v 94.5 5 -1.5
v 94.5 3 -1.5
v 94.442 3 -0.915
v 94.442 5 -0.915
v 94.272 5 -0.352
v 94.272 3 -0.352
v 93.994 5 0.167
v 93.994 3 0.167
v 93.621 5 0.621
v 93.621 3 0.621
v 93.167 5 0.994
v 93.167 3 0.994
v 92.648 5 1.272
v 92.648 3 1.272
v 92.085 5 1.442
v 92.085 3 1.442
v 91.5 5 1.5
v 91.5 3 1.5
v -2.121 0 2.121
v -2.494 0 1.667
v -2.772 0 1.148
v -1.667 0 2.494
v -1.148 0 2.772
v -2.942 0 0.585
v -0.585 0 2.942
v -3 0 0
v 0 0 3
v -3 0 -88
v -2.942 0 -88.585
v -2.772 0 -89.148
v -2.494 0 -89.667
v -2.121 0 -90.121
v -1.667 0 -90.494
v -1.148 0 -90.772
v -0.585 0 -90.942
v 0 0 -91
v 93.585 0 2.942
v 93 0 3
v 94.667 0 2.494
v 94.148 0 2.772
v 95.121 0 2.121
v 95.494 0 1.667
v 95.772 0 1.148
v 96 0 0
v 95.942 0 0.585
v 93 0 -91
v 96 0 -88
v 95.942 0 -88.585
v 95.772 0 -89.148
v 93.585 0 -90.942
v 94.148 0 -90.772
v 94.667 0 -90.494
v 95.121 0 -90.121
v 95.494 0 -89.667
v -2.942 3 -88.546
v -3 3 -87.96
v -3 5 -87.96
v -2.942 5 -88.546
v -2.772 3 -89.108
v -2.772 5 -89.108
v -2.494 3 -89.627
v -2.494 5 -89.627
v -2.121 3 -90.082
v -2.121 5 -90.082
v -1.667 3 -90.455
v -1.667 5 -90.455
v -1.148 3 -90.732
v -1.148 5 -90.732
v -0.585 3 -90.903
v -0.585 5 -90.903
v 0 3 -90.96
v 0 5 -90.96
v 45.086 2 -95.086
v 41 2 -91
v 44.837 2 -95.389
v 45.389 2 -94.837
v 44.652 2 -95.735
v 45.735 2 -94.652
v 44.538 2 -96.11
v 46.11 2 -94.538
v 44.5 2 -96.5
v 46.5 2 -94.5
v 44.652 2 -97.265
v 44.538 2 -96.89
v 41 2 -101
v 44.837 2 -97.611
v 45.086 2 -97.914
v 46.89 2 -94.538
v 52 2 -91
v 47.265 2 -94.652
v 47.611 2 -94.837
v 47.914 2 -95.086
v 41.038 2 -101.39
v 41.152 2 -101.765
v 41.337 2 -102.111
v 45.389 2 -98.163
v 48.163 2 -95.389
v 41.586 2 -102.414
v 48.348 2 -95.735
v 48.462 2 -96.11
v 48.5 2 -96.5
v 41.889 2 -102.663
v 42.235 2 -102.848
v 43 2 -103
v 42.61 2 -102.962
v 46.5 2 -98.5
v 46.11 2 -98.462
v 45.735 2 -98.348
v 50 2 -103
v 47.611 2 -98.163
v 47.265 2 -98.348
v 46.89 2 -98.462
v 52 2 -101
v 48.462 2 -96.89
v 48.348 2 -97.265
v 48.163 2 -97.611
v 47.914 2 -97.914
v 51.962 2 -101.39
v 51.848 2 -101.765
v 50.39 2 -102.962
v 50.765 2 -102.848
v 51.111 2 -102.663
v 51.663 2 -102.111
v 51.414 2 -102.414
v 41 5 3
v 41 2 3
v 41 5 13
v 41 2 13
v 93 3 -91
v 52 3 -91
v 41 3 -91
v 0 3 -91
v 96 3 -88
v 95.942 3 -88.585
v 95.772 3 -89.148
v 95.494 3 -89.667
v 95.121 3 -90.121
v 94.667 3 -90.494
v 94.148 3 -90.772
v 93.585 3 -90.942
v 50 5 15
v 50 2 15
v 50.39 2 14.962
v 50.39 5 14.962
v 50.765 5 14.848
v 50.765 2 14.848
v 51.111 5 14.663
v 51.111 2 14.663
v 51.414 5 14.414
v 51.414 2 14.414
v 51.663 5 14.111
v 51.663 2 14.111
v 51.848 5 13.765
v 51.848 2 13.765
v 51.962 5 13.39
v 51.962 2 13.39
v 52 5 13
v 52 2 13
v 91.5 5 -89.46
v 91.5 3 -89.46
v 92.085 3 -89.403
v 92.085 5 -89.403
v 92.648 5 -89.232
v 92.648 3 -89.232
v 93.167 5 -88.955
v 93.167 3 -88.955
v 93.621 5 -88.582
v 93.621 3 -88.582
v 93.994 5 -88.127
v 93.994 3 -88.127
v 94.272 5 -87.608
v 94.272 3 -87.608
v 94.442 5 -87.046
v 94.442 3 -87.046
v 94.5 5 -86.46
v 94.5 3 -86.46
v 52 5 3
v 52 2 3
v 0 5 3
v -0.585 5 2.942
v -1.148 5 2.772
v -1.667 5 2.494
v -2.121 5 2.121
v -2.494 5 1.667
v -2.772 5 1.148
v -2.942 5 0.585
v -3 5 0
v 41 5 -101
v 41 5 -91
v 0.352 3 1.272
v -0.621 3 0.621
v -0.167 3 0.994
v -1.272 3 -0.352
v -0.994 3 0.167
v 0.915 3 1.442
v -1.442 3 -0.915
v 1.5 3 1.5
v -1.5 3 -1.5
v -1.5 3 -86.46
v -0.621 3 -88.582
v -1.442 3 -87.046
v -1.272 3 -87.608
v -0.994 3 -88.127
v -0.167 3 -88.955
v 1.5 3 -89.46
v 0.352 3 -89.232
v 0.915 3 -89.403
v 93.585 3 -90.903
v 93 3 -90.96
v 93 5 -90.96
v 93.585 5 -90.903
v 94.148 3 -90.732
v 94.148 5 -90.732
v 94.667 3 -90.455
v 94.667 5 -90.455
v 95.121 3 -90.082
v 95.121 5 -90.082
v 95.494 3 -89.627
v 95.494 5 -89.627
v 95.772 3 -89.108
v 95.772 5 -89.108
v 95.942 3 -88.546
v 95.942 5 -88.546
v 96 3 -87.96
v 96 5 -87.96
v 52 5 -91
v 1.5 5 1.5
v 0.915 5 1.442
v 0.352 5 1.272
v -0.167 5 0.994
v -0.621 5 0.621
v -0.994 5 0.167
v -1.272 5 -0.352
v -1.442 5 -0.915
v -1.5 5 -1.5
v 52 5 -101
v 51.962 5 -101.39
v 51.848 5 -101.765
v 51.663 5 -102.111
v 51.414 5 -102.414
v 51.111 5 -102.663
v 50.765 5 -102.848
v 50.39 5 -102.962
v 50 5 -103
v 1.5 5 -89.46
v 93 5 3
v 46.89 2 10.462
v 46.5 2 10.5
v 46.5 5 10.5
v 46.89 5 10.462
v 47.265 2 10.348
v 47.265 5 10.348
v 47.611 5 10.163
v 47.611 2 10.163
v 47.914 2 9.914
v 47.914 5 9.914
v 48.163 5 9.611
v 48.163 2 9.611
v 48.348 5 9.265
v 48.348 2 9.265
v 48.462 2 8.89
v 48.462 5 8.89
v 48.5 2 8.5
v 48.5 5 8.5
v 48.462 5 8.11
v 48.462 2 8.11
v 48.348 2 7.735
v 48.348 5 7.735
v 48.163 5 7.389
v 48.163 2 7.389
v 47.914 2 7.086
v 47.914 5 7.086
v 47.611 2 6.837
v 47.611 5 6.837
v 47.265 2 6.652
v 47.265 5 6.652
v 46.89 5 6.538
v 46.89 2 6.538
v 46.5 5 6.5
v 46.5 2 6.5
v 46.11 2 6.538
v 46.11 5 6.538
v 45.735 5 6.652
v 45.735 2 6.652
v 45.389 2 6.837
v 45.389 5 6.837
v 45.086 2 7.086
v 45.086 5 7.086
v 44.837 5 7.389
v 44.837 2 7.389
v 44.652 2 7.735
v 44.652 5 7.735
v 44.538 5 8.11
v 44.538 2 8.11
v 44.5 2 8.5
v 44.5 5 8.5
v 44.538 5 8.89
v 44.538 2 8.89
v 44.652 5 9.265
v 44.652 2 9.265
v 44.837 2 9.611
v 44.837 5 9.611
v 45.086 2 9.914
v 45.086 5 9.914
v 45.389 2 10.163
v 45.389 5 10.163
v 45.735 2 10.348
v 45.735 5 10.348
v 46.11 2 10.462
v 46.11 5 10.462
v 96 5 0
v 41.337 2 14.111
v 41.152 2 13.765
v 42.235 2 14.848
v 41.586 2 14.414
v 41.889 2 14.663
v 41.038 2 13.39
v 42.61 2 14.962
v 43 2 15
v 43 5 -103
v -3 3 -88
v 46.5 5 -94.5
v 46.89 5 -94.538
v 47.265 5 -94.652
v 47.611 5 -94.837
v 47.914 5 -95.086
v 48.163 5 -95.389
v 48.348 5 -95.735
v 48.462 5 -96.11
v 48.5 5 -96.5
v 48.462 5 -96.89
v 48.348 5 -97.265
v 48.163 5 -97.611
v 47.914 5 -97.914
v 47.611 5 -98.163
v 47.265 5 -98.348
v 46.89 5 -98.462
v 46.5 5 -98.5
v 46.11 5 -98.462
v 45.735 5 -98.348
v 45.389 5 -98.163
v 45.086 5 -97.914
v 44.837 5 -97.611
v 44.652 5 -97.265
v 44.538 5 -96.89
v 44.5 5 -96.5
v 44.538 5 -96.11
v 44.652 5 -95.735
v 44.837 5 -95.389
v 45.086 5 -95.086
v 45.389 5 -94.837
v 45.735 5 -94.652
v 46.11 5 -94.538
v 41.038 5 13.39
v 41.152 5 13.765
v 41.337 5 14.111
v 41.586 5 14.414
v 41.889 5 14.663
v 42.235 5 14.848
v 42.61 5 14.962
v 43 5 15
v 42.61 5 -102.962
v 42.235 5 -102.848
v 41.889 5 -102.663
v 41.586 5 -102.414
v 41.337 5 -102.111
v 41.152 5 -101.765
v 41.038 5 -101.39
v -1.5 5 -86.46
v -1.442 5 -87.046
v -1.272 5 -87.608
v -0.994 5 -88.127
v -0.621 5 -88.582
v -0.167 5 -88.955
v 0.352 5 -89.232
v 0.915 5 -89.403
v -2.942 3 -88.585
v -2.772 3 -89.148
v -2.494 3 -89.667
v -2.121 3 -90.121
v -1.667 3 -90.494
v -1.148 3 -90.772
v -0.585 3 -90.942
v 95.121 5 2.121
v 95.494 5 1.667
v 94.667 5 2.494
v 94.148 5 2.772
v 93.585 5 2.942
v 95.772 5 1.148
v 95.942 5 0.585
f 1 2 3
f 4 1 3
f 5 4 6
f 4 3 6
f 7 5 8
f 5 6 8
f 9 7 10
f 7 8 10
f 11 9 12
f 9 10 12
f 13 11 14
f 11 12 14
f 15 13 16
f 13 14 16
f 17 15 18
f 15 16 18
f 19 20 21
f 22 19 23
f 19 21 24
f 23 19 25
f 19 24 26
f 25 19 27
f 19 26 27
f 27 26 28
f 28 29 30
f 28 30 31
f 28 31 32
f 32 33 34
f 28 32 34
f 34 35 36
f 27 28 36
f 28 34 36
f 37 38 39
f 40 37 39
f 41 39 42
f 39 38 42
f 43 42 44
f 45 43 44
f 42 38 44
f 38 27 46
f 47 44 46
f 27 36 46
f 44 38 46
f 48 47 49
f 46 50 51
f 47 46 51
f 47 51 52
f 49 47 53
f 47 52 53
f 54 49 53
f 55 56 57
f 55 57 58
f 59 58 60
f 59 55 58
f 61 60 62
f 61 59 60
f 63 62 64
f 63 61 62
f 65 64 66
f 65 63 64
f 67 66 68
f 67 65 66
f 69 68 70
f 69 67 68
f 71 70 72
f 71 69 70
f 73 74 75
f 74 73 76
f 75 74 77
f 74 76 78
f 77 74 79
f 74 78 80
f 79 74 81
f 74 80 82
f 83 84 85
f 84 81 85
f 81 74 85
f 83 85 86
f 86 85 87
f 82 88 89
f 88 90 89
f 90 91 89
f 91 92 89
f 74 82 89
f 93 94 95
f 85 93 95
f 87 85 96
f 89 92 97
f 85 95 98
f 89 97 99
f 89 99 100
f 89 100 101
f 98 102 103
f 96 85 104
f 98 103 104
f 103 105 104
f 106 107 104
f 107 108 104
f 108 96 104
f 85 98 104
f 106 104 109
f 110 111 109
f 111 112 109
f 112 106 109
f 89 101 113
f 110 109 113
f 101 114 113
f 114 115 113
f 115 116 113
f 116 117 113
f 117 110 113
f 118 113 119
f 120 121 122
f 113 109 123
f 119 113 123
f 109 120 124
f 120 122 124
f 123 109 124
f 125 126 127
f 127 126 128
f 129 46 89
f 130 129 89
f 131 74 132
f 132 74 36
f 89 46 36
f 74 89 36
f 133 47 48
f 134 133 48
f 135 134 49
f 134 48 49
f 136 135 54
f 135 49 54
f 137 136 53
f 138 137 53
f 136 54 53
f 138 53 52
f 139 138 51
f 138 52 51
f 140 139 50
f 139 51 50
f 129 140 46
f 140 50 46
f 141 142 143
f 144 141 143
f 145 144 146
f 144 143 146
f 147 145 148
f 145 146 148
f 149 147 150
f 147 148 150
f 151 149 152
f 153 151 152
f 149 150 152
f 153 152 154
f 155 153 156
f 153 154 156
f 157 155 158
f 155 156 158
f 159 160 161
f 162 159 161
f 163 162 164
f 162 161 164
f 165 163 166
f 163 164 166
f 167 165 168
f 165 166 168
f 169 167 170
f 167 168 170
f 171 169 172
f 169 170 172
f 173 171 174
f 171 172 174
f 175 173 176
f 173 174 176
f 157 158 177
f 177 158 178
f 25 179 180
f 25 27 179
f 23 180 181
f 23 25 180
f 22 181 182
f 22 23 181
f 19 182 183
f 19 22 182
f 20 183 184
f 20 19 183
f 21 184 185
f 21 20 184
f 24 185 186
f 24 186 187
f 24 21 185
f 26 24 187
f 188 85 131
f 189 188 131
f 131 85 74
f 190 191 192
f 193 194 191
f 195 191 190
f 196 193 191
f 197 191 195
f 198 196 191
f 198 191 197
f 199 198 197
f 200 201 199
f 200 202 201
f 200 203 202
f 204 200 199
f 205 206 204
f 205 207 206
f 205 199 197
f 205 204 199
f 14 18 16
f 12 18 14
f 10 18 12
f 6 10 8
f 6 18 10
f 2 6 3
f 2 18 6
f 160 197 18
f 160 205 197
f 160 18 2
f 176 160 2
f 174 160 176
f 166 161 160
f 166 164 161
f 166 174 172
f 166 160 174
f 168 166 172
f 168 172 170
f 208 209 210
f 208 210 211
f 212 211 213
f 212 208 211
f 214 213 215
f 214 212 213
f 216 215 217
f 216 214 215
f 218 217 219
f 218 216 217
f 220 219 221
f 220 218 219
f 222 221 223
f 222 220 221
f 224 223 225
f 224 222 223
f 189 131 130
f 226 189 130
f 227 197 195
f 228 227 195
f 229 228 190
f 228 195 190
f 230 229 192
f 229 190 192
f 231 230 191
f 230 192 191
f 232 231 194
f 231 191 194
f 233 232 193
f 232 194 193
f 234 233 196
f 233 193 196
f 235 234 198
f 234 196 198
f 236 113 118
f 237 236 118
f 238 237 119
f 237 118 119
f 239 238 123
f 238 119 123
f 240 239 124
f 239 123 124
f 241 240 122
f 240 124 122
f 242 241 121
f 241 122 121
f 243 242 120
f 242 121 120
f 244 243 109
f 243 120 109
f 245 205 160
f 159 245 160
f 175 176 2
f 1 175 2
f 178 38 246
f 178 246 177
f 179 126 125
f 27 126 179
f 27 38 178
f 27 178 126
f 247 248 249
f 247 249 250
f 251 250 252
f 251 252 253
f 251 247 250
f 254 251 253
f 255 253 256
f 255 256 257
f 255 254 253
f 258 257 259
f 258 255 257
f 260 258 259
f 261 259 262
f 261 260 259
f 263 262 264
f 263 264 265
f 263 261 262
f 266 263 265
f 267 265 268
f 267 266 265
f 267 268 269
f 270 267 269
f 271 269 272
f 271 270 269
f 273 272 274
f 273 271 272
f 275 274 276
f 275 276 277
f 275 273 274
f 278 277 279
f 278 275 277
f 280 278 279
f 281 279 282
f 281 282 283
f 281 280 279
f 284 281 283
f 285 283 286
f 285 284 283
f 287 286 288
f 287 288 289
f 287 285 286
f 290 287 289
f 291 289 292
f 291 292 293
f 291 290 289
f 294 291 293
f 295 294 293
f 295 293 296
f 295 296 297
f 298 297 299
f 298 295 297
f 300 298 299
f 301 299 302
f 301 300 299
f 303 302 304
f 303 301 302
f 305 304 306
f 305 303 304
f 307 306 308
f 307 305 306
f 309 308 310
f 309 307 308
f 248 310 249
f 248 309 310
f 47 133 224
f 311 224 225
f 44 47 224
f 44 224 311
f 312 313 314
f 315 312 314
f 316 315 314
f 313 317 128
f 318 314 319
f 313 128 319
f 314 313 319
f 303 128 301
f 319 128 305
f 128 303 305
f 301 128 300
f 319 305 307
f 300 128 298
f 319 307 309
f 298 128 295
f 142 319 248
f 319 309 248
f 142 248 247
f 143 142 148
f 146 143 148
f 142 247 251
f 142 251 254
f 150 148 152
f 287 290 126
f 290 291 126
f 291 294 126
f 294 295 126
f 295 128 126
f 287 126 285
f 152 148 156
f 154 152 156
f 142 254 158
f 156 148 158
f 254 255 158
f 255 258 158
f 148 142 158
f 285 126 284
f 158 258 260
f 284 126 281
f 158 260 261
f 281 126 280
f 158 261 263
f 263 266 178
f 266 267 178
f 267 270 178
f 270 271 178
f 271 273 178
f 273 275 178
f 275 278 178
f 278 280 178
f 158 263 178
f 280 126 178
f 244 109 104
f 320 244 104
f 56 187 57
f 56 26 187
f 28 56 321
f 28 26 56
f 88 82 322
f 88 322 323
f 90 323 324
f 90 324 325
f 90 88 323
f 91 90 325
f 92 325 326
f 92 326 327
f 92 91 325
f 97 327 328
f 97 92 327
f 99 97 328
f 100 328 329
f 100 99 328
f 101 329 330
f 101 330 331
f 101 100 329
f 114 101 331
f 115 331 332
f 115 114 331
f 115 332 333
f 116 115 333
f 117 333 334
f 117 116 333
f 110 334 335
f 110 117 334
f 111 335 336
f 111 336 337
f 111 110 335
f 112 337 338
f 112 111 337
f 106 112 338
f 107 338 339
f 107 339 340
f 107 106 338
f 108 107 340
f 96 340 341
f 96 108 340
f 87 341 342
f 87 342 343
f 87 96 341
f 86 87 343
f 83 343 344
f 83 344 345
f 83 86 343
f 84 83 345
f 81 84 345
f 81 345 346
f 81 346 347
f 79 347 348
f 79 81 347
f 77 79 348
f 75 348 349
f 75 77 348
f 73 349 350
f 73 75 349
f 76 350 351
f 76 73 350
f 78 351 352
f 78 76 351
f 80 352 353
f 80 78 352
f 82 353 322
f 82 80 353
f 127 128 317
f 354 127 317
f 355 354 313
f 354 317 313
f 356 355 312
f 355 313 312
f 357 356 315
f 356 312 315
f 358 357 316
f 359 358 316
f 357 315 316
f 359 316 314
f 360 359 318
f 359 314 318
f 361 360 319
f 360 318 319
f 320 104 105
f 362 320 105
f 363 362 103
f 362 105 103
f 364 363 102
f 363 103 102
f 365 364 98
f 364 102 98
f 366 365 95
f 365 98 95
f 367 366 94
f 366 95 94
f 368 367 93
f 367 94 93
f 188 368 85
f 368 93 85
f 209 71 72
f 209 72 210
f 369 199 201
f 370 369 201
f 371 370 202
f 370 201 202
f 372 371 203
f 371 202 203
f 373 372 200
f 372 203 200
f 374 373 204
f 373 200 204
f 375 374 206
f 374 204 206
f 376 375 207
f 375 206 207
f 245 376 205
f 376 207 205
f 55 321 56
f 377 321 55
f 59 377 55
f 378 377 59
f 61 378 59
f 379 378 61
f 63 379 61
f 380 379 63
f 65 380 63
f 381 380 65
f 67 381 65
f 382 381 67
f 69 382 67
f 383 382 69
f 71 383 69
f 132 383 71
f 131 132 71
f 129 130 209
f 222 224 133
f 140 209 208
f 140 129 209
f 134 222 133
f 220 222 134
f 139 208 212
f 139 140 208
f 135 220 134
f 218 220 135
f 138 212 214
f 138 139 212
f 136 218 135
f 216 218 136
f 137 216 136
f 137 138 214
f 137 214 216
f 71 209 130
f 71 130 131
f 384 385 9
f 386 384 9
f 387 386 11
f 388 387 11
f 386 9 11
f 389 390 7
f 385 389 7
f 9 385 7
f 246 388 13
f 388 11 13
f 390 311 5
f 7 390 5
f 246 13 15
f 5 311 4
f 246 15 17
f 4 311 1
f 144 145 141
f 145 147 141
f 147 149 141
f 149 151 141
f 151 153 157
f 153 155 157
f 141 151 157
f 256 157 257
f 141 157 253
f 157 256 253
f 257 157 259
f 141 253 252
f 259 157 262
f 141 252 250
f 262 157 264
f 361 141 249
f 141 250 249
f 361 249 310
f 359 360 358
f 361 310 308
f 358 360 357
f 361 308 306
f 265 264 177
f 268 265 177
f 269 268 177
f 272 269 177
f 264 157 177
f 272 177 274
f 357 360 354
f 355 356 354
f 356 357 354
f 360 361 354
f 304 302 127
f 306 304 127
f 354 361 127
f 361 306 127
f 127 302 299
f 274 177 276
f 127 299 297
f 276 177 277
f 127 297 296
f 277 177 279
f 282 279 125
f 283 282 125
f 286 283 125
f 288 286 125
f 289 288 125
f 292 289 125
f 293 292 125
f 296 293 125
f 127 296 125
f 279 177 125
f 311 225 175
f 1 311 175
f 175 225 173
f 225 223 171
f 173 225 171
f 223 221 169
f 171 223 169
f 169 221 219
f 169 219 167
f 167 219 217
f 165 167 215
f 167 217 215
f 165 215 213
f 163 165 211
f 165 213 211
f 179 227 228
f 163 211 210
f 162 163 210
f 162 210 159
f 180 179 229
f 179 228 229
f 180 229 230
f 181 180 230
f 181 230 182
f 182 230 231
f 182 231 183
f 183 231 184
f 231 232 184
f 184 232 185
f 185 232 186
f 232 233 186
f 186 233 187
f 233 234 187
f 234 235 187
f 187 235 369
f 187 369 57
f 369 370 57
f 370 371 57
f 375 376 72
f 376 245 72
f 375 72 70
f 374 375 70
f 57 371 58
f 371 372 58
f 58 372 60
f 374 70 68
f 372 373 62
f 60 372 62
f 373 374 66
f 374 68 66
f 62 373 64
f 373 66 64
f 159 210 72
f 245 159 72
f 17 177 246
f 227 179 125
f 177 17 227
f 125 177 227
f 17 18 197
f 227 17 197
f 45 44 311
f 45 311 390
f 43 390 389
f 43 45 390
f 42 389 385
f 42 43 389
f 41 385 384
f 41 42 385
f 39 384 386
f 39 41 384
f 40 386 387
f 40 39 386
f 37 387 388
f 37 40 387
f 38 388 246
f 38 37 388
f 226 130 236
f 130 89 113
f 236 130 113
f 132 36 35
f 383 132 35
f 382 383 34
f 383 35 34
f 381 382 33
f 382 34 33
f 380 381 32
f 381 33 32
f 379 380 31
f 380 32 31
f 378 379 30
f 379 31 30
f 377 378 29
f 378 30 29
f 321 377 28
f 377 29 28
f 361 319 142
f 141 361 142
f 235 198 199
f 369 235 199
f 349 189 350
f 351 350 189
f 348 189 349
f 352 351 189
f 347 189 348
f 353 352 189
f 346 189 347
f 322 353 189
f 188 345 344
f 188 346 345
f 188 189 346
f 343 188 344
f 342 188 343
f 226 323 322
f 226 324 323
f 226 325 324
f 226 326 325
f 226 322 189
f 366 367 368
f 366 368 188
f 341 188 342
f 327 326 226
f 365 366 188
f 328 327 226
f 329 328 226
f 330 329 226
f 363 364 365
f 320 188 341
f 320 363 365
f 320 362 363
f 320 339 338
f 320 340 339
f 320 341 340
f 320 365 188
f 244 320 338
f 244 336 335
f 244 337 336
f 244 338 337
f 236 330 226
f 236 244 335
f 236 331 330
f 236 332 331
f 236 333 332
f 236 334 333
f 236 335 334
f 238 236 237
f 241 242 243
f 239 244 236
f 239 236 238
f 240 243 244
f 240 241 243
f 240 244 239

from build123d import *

# Parameters (mm, degrees)
RESSALTO_EXTRUS_O2_DEPTH = 3
RESSALTO_EXTRUS_O3_START = 2
ESBO_O1_8_R              = 2
RESSALTO_EXTRUS_O3_DEPTH = 3
RESSALTO_EXTRUS_O4_DEPTH = 2


with BuildPart() as part:
    # Esboço1 → Ressalto-extrusão2 (new body)
    with BuildSketch(Plane(origin=(0, 0, 0), x_dir=(1, 0, 0), z_dir=(0, 1, 0))):
        with BuildLine():
            ThreePointArc((-3, 0), (-2.121320344, -2.121320344), (0, -3))
            Line((0, -3), (41, -3))
            Line((41, -3), (52, -3))
            Line((52, -3), (93, -3))
            ThreePointArc((93, -3), (95.121320344, -2.121320344), (96, 0))
            Line((96, 0), (96, 38.5))
            Line((96, 38.5), (96, 49.5))
            Line((96, 49.5), (96, 88))
            ThreePointArc((96, 88), (95.121320344, 90.121320344), (93, 91))
            Line((93, 91), (52, 91))
            Line((52, 91), (41, 91))
            Line((41, 91), (0, 91))
            ThreePointArc((0, 91), (-2.121320344, 90.121320344), (-3, 88))
            Line((-3, 88), (-3, 0))
        make_face()
    extrude(amount=RESSALTO_EXTRUS_O2_DEPTH)

    # Esboço1<8> → Ressalto-extrusão3 (add)
    # profile 1 of 2: a face of its own
    with BuildSketch(Plane(origin=(0, 0, 0), x_dir=(1, 0, 0), z_dir=(0, 1, 0)).offset(RESSALTO_EXTRUS_O3_START)):
        with BuildLine():
            Line((52, -3), (41, -3))
            Line((41, -3), (41, -13))
            ThreePointArc((41, -13), (41.585786438, -14.414213562), (43, -15))
            Line((43, -15), (50, -15))
            ThreePointArc((50, -15), (51.414213562, -14.414213562), (52, -13))
            Line((52, -13), (52, -3))
        make_face()
        with Locations((46.5, -8.5)):
            Circle(ESBO_O1_8_R, mode=Mode.SUBTRACT)
    # profile 2 of 2: a face of its own
    with BuildSketch(Plane(origin=(0, 0, 0), x_dir=(1, 0, 0), z_dir=(0, 1, 0)).offset(RESSALTO_EXTRUS_O3_START)):
        with BuildLine():
            Line((41, 101), (41, 91))
            Line((41, 91), (52, 91))
            Line((52, 91), (52, 101))
            ThreePointArc((52, 101), (51.414213562, 102.414213562), (50, 103))
            Line((50, 103), (43, 103))
            ThreePointArc((43, 103), (41.585786438, 102.414213562), (41, 101))
        make_face()
        with Locations((46.5, 96.5)):
            Circle(ESBO_O1_8_R, mode=Mode.SUBTRACT)
    extrude(amount=RESSALTO_EXTRUS_O3_DEPTH)

    # Esboço2 → Ressalto-extrusão4 (add)
    with BuildSketch(Plane(origin=(0, 3, 0), x_dir=(1, 0, 0), z_dir=(0, 1, 0))):
        with BuildLine():
            Line((0, 90.960445131), (93, 90.960445131))
            ThreePointArc((93, 90.960445131), (95.121320344, 90.081765475), (96, 87.960445131))
            Line((96, 87.960445131), (96, 0))
            ThreePointArc((96, 0), (95.121320344, -2.121320344), (93, -3))
            Line((93, -3), (0, -3))
            ThreePointArc((0, -3), (-2.121320344, -2.121320344), (-3, 0))
            Line((-3, 0), (-3, 87.960445131))
            ThreePointArc((-3, 87.960445131), (-2.121320344, 90.081765475), (0, 90.960445131))
        make_face()
        with BuildLine():
            Line((1.5, 89.460445131), (91.5, 89.460445131))
            ThreePointArc((91.5, 89.460445131), (93.621320344, 88.581765475), (94.5, 86.460445131))
            Line((94.5, 86.460445131), (94.5, 1.5))
            ThreePointArc((94.5, 1.5), (93.621320344, -0.621320344), (91.5, -1.5))
            Line((91.5, -1.5), (1.5, -1.5))
            ThreePointArc((1.5, -1.5), (-0.621320344, -0.621320344), (-1.5, 1.5))
            Line((-1.5, 1.5), (-1.5, 86.460445131))
            ThreePointArc((-1.5, 86.460445131), (-0.621320344, 88.581765475), (1.5, 89.460445131))
        make_face(mode=Mode.SUBTRACT)
    extrude(amount=RESSALTO_EXTRUS_O4_DEPTH)


solid = part.part
